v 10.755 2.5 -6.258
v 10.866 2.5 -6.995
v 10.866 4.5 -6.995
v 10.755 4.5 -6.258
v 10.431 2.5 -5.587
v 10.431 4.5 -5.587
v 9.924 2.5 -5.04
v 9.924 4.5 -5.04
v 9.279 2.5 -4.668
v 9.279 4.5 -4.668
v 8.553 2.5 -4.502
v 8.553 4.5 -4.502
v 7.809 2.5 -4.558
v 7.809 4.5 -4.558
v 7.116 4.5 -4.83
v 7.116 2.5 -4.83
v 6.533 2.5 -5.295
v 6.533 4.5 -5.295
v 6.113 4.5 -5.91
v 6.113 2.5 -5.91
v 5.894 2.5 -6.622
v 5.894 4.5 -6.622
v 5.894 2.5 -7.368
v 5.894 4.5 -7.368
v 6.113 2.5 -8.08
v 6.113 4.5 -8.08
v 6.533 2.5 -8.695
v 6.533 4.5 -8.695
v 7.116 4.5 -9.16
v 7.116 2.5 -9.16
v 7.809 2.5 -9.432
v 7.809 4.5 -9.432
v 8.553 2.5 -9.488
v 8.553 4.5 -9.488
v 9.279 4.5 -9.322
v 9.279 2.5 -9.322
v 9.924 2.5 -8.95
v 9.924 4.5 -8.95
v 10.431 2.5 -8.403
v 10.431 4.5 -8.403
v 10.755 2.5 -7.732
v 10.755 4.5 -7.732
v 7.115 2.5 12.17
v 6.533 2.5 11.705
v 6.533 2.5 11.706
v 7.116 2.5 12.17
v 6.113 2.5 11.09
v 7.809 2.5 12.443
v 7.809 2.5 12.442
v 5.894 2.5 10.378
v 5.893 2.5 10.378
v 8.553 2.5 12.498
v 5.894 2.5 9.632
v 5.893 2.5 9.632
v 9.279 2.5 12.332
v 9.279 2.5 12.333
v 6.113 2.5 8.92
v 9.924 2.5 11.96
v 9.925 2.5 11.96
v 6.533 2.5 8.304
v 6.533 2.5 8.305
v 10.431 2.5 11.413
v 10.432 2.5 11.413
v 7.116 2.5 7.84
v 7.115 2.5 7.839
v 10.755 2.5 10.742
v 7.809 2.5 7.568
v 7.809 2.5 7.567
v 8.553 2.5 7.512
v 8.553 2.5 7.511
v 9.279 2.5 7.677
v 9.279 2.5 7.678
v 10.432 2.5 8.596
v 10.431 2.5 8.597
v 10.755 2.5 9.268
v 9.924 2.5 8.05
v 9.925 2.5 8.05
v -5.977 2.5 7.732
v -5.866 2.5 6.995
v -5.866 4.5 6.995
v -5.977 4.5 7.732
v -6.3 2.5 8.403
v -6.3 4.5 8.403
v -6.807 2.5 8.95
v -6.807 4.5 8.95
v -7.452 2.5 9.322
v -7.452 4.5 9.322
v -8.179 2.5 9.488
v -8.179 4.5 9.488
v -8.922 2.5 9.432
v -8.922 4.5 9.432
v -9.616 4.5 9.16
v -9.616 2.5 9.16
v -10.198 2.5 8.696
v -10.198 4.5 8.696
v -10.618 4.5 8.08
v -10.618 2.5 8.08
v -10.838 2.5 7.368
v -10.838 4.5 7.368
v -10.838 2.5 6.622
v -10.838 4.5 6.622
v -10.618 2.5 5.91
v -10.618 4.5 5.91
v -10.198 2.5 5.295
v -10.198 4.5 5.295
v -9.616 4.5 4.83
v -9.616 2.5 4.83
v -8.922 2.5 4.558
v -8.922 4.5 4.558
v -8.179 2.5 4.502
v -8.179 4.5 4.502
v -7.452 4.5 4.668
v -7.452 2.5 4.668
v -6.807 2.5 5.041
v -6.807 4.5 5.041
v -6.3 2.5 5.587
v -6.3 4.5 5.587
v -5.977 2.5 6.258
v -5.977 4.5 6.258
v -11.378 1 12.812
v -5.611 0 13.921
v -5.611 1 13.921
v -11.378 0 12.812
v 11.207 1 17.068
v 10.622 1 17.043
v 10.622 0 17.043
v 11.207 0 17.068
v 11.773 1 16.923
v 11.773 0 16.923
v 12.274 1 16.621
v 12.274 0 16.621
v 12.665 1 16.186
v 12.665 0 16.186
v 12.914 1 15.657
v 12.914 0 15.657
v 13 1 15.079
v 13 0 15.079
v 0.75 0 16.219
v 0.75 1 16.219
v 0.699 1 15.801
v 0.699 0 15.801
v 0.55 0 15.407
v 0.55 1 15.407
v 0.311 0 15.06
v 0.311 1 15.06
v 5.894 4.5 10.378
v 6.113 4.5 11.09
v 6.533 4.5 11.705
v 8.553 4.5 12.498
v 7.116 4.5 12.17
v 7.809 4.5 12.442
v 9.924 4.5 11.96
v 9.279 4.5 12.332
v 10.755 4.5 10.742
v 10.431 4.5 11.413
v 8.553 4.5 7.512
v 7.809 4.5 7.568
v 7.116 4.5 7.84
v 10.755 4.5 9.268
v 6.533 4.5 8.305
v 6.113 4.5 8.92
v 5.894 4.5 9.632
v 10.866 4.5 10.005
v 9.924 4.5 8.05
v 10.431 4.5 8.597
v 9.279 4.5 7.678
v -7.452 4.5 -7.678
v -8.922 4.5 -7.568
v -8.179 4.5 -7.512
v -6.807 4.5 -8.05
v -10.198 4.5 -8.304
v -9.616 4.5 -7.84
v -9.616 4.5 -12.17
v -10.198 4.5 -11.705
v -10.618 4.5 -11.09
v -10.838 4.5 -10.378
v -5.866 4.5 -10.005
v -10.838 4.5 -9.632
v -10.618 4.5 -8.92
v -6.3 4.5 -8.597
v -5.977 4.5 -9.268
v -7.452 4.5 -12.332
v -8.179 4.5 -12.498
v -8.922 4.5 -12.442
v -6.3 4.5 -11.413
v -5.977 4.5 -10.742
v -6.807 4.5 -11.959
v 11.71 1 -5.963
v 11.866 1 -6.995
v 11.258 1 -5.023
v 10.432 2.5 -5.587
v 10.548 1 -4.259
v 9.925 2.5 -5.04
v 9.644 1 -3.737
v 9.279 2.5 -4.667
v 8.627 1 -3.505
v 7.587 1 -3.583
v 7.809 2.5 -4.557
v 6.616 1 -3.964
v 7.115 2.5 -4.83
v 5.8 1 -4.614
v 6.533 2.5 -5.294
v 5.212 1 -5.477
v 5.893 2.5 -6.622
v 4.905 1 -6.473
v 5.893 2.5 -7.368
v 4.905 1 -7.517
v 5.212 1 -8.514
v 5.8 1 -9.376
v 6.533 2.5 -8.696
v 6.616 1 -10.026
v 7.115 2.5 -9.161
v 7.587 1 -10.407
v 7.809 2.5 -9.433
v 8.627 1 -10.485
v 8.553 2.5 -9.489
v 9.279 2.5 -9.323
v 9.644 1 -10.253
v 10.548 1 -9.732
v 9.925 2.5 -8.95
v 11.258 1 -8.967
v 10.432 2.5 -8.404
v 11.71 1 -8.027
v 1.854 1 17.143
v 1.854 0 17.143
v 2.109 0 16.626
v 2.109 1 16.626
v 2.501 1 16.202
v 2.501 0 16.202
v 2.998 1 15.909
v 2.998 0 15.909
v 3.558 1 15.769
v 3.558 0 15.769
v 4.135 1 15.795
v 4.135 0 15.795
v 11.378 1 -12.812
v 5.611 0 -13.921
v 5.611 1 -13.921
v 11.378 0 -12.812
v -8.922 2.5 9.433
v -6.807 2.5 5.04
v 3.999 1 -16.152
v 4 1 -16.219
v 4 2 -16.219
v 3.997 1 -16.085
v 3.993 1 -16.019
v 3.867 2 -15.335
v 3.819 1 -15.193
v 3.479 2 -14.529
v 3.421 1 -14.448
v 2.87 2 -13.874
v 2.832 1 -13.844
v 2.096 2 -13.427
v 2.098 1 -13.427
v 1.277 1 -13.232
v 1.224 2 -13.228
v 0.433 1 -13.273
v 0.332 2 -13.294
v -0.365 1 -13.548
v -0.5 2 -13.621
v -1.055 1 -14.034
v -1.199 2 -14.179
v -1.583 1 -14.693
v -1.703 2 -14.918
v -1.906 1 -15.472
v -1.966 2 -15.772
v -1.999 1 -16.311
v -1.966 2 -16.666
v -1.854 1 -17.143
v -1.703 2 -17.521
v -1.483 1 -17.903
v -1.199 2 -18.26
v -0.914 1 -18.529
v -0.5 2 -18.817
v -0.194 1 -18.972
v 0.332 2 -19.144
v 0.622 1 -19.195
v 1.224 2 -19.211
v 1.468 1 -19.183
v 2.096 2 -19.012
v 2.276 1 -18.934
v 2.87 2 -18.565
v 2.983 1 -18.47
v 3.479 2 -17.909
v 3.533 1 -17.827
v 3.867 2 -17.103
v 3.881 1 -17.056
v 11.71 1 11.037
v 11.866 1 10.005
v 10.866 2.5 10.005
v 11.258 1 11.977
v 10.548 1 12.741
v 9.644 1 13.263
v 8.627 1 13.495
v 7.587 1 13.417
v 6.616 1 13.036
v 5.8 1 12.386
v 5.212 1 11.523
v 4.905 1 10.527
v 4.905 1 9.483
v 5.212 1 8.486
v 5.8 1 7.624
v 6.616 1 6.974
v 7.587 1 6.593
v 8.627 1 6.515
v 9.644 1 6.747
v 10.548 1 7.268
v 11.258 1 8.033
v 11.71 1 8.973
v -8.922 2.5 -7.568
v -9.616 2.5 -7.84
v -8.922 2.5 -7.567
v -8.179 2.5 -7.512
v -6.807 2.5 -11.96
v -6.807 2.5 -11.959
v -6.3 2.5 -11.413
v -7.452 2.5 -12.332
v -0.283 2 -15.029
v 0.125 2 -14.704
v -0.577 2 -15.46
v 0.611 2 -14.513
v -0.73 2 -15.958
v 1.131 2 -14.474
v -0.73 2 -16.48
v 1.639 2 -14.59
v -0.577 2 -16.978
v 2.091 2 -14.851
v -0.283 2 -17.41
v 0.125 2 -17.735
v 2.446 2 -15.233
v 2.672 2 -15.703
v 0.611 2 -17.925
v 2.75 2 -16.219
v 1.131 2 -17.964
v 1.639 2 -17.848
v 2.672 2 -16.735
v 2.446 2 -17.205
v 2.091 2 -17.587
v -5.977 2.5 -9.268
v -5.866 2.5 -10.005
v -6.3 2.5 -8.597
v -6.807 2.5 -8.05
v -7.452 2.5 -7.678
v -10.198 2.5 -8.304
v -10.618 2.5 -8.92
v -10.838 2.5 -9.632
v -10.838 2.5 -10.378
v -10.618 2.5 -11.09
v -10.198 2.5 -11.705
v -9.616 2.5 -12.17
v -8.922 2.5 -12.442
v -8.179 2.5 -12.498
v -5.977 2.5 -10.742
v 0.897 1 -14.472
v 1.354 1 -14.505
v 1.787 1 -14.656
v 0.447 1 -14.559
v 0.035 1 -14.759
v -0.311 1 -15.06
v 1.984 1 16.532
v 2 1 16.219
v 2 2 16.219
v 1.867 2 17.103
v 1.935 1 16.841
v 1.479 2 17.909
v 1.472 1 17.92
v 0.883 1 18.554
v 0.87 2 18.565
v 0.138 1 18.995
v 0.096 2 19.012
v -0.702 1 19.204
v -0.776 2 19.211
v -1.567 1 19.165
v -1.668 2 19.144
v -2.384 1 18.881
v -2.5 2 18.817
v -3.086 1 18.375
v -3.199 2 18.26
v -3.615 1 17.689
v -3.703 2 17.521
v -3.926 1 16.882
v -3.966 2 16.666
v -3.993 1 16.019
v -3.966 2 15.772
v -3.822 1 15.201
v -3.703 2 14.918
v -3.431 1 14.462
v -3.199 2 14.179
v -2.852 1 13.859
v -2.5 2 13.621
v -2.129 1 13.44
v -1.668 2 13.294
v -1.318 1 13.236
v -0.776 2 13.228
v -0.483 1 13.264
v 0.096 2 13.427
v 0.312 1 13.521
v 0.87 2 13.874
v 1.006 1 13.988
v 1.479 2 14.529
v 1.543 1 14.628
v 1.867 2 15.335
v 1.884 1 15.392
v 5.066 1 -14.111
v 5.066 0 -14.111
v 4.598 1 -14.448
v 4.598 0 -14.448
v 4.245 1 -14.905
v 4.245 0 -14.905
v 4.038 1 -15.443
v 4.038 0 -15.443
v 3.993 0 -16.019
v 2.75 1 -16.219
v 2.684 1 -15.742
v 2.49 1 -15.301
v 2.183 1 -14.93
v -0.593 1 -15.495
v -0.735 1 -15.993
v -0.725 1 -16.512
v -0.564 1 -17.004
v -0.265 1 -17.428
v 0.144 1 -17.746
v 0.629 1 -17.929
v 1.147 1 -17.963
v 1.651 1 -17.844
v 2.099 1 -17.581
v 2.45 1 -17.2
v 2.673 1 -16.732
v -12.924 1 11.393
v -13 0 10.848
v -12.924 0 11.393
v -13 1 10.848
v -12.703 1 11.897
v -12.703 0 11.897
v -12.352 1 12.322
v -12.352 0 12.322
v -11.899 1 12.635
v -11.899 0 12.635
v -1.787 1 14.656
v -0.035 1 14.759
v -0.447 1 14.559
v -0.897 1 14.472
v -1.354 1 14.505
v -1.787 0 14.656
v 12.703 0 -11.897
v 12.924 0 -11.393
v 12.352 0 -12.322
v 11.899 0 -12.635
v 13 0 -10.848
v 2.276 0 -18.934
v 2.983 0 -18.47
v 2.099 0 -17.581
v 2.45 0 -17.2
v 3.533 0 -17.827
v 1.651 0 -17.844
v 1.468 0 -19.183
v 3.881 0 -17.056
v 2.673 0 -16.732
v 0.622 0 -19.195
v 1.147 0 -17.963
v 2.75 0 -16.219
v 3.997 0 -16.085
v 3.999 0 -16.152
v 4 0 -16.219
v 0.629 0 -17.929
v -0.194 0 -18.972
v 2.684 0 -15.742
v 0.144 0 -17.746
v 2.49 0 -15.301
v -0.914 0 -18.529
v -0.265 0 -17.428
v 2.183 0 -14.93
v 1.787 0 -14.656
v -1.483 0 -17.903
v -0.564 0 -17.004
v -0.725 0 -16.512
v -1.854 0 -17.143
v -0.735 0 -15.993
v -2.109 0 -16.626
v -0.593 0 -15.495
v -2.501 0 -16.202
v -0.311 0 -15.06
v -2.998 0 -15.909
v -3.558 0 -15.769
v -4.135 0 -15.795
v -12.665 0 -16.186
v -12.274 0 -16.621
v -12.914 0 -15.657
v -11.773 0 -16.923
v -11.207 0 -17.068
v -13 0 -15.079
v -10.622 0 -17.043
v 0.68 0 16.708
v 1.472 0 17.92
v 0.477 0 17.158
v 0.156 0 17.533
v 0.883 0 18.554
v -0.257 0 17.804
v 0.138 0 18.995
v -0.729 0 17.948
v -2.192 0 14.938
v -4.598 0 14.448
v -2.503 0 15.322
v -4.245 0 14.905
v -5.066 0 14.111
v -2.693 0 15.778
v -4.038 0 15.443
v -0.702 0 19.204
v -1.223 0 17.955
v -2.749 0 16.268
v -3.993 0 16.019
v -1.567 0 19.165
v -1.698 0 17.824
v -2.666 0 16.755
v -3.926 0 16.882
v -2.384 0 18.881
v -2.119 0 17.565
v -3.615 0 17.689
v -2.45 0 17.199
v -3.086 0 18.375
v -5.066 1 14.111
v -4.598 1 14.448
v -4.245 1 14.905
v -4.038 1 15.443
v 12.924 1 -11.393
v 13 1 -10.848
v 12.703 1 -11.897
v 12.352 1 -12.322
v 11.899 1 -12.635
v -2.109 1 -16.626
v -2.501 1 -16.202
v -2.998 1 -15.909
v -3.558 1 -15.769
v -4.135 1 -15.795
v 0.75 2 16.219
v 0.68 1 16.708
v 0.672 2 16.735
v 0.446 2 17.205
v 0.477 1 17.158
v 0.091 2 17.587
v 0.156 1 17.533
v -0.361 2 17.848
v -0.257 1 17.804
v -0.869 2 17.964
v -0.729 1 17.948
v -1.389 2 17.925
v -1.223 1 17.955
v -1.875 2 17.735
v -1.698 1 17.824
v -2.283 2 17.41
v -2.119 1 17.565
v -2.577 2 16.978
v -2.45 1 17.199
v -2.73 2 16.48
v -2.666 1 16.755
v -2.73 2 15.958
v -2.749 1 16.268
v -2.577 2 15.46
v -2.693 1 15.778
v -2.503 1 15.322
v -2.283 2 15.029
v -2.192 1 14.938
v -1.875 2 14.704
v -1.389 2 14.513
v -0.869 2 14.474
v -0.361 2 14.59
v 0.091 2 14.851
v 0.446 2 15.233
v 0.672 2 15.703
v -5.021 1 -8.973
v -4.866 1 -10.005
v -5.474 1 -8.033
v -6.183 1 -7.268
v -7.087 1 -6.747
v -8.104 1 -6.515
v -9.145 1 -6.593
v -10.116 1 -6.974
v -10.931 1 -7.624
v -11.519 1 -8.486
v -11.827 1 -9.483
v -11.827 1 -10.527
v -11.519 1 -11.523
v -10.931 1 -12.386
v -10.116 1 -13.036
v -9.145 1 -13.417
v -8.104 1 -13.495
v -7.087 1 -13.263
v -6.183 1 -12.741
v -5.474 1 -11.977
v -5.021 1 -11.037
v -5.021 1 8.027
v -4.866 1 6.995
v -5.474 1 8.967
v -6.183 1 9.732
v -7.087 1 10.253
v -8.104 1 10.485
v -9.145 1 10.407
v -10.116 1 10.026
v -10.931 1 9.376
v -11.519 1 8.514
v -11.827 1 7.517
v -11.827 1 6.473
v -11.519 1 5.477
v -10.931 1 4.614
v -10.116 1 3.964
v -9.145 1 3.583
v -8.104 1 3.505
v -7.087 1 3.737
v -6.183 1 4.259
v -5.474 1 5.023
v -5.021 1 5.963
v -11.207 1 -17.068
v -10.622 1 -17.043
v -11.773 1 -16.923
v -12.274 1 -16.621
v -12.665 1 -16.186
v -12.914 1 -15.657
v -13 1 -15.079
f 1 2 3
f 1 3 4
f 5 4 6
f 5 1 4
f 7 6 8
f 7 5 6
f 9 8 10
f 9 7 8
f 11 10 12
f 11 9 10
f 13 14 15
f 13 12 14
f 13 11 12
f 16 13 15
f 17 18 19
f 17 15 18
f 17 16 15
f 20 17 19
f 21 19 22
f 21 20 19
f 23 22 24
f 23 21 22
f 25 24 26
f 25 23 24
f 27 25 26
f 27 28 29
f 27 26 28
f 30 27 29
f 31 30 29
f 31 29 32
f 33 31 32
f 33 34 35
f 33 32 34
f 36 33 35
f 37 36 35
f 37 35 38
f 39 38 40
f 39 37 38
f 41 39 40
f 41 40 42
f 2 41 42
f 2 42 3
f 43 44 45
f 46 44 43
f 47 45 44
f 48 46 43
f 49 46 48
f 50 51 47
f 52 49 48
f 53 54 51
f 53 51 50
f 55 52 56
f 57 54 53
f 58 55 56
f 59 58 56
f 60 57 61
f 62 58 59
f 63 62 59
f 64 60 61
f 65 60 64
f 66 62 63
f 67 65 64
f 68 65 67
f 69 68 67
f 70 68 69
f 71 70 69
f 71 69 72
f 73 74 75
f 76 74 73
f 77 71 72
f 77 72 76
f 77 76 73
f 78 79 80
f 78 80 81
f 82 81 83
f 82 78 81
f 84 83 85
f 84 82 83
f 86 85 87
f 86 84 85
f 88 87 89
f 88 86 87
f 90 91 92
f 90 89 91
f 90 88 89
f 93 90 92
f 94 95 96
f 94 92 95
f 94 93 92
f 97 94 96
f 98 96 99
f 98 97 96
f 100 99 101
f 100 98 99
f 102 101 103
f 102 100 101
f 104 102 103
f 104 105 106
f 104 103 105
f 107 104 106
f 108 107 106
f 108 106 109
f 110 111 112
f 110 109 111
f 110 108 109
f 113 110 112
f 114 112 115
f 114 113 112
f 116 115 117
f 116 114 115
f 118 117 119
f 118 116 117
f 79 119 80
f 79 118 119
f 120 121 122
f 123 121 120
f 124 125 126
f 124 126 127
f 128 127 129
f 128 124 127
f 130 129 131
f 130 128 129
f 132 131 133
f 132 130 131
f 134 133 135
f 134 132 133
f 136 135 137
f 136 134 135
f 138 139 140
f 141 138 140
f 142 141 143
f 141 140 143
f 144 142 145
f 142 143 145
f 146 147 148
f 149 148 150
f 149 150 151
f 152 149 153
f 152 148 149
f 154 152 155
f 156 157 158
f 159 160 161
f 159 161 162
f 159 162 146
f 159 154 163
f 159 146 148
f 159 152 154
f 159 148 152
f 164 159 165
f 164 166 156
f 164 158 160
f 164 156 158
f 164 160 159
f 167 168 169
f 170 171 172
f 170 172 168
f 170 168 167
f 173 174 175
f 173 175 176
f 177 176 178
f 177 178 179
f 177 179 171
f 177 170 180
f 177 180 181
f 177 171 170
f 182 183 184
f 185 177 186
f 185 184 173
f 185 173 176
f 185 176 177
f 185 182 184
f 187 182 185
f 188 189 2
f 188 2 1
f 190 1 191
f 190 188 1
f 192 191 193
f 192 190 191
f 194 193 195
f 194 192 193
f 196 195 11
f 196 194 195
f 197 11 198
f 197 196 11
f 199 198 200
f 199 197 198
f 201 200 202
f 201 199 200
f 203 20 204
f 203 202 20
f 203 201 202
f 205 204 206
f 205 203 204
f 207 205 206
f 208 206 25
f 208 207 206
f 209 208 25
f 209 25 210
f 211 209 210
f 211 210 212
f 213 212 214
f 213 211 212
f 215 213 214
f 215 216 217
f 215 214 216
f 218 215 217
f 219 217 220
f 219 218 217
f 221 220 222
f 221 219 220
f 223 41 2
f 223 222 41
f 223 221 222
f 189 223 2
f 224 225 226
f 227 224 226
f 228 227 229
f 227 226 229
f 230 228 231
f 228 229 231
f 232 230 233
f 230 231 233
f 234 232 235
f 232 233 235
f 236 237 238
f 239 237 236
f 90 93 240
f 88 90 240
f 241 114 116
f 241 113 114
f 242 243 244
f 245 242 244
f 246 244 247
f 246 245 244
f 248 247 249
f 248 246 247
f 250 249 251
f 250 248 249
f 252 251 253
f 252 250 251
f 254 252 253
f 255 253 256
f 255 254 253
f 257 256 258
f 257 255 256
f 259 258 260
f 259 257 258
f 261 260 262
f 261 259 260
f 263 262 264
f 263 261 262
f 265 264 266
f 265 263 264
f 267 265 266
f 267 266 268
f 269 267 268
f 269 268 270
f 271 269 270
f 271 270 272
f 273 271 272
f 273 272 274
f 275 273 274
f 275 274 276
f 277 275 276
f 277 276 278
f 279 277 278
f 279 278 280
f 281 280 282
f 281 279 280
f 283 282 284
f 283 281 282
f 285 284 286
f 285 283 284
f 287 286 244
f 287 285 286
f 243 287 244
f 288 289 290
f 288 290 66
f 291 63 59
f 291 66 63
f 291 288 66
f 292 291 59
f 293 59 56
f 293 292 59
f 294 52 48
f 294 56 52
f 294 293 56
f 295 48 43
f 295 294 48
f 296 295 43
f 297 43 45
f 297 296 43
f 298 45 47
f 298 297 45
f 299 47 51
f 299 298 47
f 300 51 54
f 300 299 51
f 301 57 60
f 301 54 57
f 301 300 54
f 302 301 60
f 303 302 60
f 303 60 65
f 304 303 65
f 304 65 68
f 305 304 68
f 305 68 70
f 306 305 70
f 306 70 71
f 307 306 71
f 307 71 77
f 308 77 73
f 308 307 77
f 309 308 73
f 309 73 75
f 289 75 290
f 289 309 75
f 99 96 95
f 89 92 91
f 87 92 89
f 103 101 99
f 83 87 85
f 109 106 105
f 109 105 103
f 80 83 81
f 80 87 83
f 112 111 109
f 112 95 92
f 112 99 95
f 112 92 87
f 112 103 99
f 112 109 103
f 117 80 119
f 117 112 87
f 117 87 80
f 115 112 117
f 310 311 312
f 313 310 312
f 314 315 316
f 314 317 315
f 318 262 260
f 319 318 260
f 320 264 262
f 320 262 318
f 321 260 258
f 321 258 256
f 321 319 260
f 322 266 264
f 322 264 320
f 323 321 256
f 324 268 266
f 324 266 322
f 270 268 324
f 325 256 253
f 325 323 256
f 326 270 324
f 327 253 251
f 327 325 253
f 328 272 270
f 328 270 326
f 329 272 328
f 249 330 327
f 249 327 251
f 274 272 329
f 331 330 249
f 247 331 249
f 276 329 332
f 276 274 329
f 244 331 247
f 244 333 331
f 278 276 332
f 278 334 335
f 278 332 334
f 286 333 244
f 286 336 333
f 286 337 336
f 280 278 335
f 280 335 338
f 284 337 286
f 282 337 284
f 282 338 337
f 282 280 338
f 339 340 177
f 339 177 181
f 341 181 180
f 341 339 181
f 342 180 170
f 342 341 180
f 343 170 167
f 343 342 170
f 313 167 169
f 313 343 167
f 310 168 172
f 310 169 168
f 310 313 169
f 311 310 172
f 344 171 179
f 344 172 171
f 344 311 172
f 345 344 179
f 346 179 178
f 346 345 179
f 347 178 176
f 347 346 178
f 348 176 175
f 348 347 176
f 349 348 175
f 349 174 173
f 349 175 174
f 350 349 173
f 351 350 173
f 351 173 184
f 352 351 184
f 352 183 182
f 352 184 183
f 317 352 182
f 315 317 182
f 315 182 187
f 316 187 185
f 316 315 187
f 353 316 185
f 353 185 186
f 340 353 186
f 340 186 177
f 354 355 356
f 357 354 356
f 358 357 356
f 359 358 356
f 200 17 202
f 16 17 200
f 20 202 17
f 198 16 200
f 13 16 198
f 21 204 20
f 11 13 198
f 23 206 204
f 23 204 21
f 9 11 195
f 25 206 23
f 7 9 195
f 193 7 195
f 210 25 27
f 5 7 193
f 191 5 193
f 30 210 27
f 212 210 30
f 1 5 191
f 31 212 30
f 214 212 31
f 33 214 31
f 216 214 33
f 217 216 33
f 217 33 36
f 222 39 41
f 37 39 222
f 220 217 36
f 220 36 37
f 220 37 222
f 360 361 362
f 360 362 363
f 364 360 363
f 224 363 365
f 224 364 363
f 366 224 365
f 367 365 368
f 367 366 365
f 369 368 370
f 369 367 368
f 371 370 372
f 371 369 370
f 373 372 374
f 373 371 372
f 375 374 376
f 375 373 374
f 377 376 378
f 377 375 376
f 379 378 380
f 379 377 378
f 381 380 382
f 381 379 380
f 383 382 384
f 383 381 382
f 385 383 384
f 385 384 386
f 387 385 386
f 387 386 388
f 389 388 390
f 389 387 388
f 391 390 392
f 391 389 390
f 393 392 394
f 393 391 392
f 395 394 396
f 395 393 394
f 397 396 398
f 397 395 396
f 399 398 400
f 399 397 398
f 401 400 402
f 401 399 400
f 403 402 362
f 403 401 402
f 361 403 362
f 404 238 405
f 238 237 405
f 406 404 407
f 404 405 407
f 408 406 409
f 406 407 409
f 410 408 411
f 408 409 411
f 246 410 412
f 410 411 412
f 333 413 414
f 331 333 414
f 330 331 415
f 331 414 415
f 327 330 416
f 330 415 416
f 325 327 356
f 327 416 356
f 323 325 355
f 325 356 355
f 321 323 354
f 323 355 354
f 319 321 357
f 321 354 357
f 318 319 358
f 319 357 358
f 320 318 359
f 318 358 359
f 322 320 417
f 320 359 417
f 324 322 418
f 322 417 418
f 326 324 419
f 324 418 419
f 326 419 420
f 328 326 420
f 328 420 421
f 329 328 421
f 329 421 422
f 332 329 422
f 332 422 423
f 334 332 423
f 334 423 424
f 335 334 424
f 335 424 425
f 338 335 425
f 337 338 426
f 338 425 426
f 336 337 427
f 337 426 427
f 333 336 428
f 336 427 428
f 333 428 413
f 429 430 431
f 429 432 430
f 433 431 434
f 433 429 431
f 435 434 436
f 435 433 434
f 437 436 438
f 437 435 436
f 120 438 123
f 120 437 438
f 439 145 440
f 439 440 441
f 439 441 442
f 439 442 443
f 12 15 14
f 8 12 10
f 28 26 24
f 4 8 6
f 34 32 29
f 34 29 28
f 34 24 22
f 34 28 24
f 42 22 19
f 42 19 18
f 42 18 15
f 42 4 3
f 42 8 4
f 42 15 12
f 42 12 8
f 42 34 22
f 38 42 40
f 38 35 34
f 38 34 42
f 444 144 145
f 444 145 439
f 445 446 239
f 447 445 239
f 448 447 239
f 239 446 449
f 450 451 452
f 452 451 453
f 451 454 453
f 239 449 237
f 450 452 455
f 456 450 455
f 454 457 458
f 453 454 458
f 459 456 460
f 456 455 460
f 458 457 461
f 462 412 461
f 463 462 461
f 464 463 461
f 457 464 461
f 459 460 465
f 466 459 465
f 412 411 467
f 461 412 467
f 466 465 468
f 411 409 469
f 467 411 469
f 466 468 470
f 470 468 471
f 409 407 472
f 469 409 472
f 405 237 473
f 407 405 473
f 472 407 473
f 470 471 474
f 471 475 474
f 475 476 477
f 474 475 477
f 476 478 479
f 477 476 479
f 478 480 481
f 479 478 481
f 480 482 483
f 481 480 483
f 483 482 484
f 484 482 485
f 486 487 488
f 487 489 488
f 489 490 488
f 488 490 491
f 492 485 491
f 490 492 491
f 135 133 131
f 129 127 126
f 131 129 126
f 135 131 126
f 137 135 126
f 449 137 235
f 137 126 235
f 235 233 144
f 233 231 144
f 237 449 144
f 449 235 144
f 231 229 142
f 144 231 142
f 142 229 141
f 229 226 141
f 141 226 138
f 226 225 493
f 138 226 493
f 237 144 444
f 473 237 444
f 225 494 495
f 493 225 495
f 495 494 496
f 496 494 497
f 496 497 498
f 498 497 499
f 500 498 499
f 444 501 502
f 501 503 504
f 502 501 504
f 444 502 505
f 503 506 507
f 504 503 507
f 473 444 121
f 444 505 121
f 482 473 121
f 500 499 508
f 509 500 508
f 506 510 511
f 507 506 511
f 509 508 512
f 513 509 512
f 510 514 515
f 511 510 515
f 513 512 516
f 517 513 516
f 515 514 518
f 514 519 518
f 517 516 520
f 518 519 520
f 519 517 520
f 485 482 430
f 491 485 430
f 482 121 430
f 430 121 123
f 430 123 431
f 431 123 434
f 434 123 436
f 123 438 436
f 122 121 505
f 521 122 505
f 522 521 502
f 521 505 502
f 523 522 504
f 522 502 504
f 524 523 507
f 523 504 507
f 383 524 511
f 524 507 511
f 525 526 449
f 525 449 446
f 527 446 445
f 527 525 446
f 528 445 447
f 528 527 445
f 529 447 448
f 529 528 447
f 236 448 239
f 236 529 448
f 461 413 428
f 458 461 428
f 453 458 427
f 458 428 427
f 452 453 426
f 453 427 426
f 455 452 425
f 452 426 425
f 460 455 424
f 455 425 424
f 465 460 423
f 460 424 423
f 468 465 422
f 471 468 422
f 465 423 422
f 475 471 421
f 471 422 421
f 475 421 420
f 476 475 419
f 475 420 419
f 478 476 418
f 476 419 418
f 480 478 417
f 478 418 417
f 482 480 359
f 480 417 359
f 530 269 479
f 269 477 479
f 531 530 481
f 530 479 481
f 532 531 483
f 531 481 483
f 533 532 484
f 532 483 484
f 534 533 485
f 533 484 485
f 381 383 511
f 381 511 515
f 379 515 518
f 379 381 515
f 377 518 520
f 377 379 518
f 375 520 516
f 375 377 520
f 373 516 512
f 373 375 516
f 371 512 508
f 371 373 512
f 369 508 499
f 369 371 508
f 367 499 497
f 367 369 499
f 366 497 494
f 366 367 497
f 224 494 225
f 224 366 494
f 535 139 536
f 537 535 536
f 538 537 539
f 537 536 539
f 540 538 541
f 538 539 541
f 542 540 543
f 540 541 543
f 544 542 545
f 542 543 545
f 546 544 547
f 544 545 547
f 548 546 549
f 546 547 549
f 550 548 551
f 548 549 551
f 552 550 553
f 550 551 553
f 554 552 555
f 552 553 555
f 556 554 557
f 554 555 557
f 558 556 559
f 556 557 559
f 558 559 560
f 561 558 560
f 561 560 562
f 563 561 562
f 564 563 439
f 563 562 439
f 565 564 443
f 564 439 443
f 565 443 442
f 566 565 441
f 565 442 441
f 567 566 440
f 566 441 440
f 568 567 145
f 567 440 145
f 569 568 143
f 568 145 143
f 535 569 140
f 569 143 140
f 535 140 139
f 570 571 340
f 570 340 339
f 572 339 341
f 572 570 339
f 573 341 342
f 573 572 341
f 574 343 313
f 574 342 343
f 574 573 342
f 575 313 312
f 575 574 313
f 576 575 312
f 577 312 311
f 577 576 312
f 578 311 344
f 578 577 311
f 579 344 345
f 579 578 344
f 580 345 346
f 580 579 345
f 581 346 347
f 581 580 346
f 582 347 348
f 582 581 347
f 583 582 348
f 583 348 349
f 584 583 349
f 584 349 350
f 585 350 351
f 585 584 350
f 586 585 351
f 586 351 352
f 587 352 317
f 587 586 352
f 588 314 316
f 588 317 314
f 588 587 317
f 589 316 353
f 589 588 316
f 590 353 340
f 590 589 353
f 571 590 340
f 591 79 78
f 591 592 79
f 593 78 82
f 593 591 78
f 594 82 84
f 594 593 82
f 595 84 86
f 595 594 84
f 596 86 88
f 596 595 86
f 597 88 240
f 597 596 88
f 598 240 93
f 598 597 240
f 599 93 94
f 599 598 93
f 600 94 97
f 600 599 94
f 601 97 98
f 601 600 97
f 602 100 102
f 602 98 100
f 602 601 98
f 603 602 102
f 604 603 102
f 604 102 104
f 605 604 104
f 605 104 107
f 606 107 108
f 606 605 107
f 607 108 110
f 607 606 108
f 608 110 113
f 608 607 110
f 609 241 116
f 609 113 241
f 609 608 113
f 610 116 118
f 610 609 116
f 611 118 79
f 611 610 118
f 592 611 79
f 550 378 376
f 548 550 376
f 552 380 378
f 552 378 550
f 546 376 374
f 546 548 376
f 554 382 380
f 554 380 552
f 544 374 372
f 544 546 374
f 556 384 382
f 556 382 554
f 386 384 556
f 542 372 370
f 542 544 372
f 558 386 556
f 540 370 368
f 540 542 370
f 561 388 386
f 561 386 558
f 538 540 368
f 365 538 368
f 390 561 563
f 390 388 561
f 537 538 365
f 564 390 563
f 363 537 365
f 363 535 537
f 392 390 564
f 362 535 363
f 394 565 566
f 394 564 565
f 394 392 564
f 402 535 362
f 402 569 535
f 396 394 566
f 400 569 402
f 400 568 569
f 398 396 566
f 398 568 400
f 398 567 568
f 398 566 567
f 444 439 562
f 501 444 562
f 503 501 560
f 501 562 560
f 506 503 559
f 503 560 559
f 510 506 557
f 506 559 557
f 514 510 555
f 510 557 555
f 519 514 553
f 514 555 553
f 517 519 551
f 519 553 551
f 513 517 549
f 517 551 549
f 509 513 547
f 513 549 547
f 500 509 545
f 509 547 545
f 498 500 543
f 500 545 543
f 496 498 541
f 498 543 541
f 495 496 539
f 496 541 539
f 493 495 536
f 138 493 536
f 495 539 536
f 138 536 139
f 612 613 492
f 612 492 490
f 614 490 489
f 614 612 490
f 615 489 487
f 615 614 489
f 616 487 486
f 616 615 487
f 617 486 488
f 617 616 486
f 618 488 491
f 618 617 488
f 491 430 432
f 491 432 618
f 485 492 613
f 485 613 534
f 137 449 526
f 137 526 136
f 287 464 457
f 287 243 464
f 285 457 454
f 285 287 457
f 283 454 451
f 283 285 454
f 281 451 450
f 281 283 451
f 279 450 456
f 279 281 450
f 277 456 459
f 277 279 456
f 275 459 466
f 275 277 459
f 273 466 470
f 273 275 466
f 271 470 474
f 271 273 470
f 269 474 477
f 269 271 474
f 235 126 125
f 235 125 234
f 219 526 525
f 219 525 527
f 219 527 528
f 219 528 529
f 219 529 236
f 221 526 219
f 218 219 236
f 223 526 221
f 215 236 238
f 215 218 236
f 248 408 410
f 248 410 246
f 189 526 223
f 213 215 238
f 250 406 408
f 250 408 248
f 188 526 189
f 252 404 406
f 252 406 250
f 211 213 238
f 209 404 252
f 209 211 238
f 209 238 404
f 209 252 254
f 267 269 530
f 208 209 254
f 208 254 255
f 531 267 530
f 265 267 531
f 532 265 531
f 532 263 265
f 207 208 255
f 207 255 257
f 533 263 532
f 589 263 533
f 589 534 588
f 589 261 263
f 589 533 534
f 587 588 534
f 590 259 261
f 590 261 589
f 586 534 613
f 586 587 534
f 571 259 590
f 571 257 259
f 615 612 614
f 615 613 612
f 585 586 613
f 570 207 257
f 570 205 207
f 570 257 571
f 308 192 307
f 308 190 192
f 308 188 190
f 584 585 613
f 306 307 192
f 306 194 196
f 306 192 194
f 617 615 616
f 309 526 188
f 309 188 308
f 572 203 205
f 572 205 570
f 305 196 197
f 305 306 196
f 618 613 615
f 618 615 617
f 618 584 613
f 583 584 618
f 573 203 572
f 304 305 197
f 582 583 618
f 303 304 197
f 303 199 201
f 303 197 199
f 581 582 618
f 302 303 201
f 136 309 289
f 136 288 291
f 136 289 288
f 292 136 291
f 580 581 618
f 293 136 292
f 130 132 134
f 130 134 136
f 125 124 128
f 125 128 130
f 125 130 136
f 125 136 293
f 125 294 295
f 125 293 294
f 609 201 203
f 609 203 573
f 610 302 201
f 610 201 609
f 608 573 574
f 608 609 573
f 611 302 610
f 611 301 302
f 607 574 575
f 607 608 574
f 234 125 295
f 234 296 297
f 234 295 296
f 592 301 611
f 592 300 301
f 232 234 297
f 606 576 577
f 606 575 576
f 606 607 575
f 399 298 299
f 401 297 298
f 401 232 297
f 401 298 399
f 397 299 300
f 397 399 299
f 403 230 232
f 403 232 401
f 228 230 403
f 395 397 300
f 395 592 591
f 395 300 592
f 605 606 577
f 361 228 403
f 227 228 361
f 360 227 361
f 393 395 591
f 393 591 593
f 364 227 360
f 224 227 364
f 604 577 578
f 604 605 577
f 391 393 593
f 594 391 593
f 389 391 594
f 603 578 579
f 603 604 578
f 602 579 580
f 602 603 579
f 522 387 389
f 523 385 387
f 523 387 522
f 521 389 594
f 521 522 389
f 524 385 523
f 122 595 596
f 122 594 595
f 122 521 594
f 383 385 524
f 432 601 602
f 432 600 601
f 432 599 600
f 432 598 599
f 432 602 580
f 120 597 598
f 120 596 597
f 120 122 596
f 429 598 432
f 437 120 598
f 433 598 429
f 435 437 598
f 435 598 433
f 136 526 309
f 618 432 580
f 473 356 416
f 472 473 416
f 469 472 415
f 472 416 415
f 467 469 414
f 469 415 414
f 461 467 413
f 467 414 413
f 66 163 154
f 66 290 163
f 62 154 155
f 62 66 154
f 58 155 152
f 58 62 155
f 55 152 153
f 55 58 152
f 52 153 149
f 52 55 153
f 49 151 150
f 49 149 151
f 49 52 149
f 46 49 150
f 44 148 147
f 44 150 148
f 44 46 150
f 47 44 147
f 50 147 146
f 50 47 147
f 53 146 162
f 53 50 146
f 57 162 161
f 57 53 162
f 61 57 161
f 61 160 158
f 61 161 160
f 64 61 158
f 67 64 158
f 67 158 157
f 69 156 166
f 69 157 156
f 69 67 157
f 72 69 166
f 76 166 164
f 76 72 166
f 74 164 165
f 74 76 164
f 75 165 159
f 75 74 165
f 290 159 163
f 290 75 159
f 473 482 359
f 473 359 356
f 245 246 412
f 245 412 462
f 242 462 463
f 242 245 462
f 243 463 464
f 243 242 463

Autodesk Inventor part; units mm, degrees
ref_plane "YZ Plane" through (0, 0, 0) normal (1, 0, 0) x (0, 1, 0)
ref_plane "XZ Plane" through (0, 0, 0) normal (0, 1, 0) x (-1, 0, 0)
ref_plane "XY Plane" through (0, 0, 0) normal (0, 0, 1) x (1, 0, 0)
sketch "Esquisse2" plane through (0, 0, 0) normal (0, 1, 0) x (-1, 0, 0)
  line L0 (13, 12.5) -> (13, -17.5)
  line L1 (13, -17.5) -> (-13, -12.5)
  line L2 (-13, -12.5) -> (-13, 17.5)
  line L3 (-13, 17.5) -> (13, 12.5)
  point P0 (0, 0)
  dimension "d0" = 30
  dimension "d1" = 26
  dimension "d2" = 13
  dimension "d4" = 5
  dimension "d5" = 30
  dimension "d11" = 12.5
extrude "Extrusion1" add sketch "Esquisse2" along normal blind 1
sketch "Esquisse3" plane through (0, 1, 0) normal (0, 1, 0) x (1, 0, 0)
  circle A0 centre (-1, -16.2192) radius 1.75
  circle A1 centre (1, 16.2192) radius 1.75
  line L0 (-1, -16.2192) -> (0, 0) construction
  line L1 (0, 0) -> (1, 16.2192) construction
  line L2 (13, -17.5) -> (13, 12.5) construction
  circle A2 centre (-1, -16.2192) radius 3
  circle A3 centre (1, 16.2192) radius 3
  dimension "d8" = 3.5
  dimension "d9" = 3.5
  dimension "d10" = 36
  dimension "d13" = 12
  dimension "d14" = 6
  dimension "d15" = 6
extrude "Extrusion2" add sketch "Esquisse3" along normal blind 1 and the other way blind 1
fillet "Congé1" radius 2 4 edges at (-3.3509, 0.5, 14.3556) (1.8745, 0.5, 15.3605) (-1.8745, 0.5, -15.3605) (3.3509, 0.5, -14.3556)
fillet "Congé2" radius 2 4 edges at (13, 0.5, -12.5) (13, 0.5, 17.5) (-13, 0.5, 12.5) (-13, 0.5, -17.5)
sketch "Esquisse4" plane through (0, 1, 0) normal (0, 1, 0) x (1, 0, 0)
  circle A0 centre (-8.3657, -6.9951) radius 3.5
  circle A1 centre (-8.3657, 10.0049) radius 3.5
  circle A2 centre (8.3657, 6.9951) radius 3.5
  circle A3 centre (8.3657, -10.0049) radius 3.5
  line L0 (0, -25) -> (0, 25) construction
  line L1 (-13.9609, 0) -> (15.5775, 0) construction
  line L2 (-13, 15.0787) -> (-13, -10.848) construction
  circle A4 centre (-1, -16.2192) radius 1.75 construction
  line L3 (-8.3657, -6.9951) -> (0, -6.9951) construction
  line L4 (8.3657, -10.0049) -> (0, -10.0049) construction
  line L5 (-8.3657, 10.0049) -> (0, 10.0049) construction
  line L6 (8.3657, 6.9951) -> (0, 6.9951) construction
  line L7 (-7.4081, -6.9951) -> (-7.4081, 0) construction
  line L8 (8.3657, 6.9951) -> (8.3657, 0) construction
  point P0 (0, 0)
  dimension "d22" = 7
  dimension "d23" = 7
  dimension "d24" = 7
  dimension "d25" = 7
  dimension "d26" = 17
  dimension "d27" = 17
  dimension "d28" = 24
  dimension "d29" = 24
  dimension "d30" = 13
  dimension "d32" = 50
  dimension "d33" = 25
  dimension "d34" = 25
extrude "Extrusion3" add sketch "Esquisse4" along normal blind 1.5
sketch "Esquisse5" plane through (-8.3657, 2.5, 6.9951) normal (0, 1, 0) x (1, 0, 0)
  circle A0 centre (0, 0) radius 2.5
  circle A1 centre (0, 17) radius 2.5
  circle A2 centre (16.7314, -3.0099) radius 2.5
  circle A3 centre (16.7314, 13.9901) radius 2.5
  circle A4 centre (16.7314, 13.9901) radius 3.5 projected
  circle A5 centre (0, 17) radius 3.5 projected
  circle A6 centre (16.7314, -3.0099) radius 3.5 projected
  circle A7 centre (0, 0) radius 3.5 projected
  point P0 (8.3657, 6.9951)
  dimension "d37" = 5
  dimension "d38" = 5
  dimension "d39" = 5
  dimension "d40" = 5
extrude "Extrusion4" add sketch "Esquisse5" along normal blind 2 contours A0 | A1 | A2 | A3
chamfer "Chanfrein1" distance 1 distance2 1.5 1 edges at (-11.8657, 2.5, 6.9951) measured on face at (-5.2329, 2.5, 7.2743)
chamfer "Chanfrein2" distance 1 distance2 1.5 1 edges at (-11.8657, 2.5, -10.0049) measured on face at (-5.2329, 2.5, -9.7257)
chamfer "Chanfrein3" distance 1 distance2 1.5 1 edges at (4.8657, 2.5, 10.0049) measured on face at (11.4743, 2.5, 10.4836)
chamfer "Chanfrein4" distance 1 distance2 1.5 1 edges at (4.8657, 2.5, -6.9951) measured on face at (11.4985, 2.5, -6.7159)
equation "\"d2\" = 0.5 * d1"
equation "\"d5\" = d0"
equation "\"d11\" = 0.5 * d0 - 0.5 * d4"
equation "\"d9\" = d8"
equation "\"d15\" = d14"
equation "\"d23\" = d22"
equation "\"d24\" = d22"
equation "\"d25\" = d22"
equation "\"d27\" = d26"
equation "\"d28\" = d26 + d22"
equation "\"d29\" = d28"
equation "\"d33\" = 0.5 * d32"
equation "\"d34\" = d33"
equation "\"d38\" = d37"
equation "\"d39\" = d37"
equation "\"d40\" = d37"
properties part number "Membrane - Boutons" material "Caoutchouc"
